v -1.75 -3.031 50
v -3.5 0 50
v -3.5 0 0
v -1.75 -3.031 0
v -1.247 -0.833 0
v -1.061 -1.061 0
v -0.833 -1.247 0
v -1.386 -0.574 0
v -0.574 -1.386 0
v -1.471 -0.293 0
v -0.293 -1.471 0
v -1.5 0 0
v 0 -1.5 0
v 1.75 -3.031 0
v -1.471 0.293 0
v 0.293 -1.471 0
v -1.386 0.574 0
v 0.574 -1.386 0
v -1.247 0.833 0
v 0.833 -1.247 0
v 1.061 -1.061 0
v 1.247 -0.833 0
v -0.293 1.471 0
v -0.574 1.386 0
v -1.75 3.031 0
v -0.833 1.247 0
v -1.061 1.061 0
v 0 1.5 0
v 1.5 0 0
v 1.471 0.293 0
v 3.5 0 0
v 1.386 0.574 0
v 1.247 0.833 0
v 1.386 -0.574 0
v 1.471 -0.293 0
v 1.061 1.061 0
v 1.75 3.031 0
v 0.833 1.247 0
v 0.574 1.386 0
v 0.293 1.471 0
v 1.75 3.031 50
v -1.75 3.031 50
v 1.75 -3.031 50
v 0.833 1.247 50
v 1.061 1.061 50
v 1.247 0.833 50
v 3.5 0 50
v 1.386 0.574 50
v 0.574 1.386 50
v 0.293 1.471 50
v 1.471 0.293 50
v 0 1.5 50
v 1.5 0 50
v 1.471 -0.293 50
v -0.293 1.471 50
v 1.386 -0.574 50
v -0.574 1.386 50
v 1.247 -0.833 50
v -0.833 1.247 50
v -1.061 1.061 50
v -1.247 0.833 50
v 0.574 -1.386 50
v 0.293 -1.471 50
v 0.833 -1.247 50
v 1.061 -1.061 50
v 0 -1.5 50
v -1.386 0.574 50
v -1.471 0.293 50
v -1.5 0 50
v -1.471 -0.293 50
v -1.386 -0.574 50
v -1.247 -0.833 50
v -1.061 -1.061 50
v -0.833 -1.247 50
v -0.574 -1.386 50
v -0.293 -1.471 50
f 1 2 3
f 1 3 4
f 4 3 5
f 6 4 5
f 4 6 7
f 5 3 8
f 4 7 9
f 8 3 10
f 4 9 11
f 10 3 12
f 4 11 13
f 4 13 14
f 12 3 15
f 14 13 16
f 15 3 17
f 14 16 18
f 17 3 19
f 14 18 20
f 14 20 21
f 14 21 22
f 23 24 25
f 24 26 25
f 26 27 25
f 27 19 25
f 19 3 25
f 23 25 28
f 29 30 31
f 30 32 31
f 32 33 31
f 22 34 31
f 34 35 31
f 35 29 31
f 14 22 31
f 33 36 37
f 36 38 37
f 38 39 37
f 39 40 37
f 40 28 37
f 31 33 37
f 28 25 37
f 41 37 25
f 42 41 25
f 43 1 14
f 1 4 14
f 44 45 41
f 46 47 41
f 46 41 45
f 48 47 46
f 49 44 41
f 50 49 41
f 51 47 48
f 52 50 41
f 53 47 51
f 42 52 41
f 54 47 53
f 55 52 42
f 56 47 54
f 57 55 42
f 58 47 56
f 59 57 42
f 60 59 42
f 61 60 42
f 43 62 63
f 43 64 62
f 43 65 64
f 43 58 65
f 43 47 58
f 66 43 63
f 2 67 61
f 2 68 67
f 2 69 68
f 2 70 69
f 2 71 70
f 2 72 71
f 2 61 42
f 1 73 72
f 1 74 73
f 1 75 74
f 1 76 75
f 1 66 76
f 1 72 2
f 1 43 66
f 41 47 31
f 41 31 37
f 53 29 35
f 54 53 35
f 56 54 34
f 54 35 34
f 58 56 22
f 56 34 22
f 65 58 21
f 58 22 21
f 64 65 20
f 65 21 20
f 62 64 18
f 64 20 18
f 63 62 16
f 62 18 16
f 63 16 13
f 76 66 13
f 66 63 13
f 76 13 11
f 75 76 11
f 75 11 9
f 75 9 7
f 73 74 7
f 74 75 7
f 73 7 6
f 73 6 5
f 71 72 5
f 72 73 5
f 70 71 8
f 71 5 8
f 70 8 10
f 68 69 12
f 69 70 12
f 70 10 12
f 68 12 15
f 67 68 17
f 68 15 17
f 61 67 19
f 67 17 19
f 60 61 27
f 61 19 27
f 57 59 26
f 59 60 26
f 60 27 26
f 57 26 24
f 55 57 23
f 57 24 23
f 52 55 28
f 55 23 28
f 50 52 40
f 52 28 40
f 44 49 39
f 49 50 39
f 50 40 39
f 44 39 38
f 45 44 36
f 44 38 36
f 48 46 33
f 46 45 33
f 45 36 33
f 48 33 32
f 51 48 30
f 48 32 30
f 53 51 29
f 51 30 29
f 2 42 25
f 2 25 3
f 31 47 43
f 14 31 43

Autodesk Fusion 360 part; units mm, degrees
sketch "スケッチ1" plane through (0, 0, 0) normal (0, 0, 1) x (1, 0, 0)
  line L0 (3, 1.7321) -> (0, 3.4641)
  line L1 (0, 3.4641) -> (-3, 1.7321)
  line L2 (-3, 1.7321) -> (-3, -1.7321)
  line L3 (-3, -1.7321) -> (0, -3.4641)
  line L4 (0, -3.4641) -> (3, -1.7321)
  line L5 (3, -1.7321) -> (3, 1.7321)
  circle A0 centre (0, 0) radius 1.5
extrude "押し出し1" add sketch "スケッチ1" along normal blind 35
sketch "スケッチ2" plane through (0, 0, 35) normal (0, 0, 1) x (-1, 0, 0)
  circle A0 centre (0, 0) radius 1.5
  line L0 (-3, 1.7321) -> (-3, -1.7321)
  line L1 (-3, -1.7321) -> (0, -3.4641)
  line L2 (0, -3.4641) -> (3, -1.7321)
  line L3 (3, -1.7321) -> (3, 1.7321)
  line L4 (3, 1.7321) -> (0, 3.4641)
  line L5 (0, 3.4641) -> (-3, 1.7321)
  line L6 (-3.5, 0) -> (-1.75, -3.0311)
  line L7 (-1.75, -3.0311) -> (1.75, -3.0311)
  line L8 (1.75, -3.0311) -> (3.5, 0)
  line L9 (3.5, 0) -> (1.75, 3.0311)
  line L10 (1.75, 3.0311) -> (-1.75, 3.0311)
  line L11 (-1.75, 3.0311) -> (-3.5, 0)
extrude "押し出し2" add sketch "スケッチ2" along normal blind 4 contours L0 L1 L2 L3 L4 L5 L6 L7 L8 L9 L10 L11 | L0 L6 L11 | L5 L10 L11 | L1 L6 L7 | L4 L9 L10 | L2 L7 L8 | L3 L8 L9
extrude "押し出し3" cut 6 faces at (0, -3.1754, 35) (2.75, -1.5877, 35) (-2.75, -1.5877, 35) (-2.75, 1.5877, 35) (0, 3.1754, 35) (2.75, 1.5877, 35) along direction (0, 0, -1) blind 40
extrude "押し出し4" add 6 faces at (1.5833, 2.7424, 35) (3.1667, 0, 35) (-1.5833, 2.7424, 35) (1.5833, -2.7424, 35) (-1.5833, -2.7424, 35) (-3.1667, 0, 35) along direction (0, 0, -1) blind 35
extrude "押し出し5" cut 1 faces at (2.2005, 1.2273, 39) along direction (0, 0, -1) blind 4
extrude "押し出し6" add 1 faces at (0.0374, 2.5193, 35) along direction (0, 0, 1) blind 10
extrude "押し出し7" add 1 faces at (0.0374, 2.5193, 45) along direction (0, 0, 1) blind 40
extrude "押し出し8" cut 1 faces at (0.0374, 2.5193, 85) along direction (0, 0, -1) blind 50
extrude "押し出し9" add 1 faces at (0.0374, 2.5193, 35) along direction (0, 0, 1) blind 15
